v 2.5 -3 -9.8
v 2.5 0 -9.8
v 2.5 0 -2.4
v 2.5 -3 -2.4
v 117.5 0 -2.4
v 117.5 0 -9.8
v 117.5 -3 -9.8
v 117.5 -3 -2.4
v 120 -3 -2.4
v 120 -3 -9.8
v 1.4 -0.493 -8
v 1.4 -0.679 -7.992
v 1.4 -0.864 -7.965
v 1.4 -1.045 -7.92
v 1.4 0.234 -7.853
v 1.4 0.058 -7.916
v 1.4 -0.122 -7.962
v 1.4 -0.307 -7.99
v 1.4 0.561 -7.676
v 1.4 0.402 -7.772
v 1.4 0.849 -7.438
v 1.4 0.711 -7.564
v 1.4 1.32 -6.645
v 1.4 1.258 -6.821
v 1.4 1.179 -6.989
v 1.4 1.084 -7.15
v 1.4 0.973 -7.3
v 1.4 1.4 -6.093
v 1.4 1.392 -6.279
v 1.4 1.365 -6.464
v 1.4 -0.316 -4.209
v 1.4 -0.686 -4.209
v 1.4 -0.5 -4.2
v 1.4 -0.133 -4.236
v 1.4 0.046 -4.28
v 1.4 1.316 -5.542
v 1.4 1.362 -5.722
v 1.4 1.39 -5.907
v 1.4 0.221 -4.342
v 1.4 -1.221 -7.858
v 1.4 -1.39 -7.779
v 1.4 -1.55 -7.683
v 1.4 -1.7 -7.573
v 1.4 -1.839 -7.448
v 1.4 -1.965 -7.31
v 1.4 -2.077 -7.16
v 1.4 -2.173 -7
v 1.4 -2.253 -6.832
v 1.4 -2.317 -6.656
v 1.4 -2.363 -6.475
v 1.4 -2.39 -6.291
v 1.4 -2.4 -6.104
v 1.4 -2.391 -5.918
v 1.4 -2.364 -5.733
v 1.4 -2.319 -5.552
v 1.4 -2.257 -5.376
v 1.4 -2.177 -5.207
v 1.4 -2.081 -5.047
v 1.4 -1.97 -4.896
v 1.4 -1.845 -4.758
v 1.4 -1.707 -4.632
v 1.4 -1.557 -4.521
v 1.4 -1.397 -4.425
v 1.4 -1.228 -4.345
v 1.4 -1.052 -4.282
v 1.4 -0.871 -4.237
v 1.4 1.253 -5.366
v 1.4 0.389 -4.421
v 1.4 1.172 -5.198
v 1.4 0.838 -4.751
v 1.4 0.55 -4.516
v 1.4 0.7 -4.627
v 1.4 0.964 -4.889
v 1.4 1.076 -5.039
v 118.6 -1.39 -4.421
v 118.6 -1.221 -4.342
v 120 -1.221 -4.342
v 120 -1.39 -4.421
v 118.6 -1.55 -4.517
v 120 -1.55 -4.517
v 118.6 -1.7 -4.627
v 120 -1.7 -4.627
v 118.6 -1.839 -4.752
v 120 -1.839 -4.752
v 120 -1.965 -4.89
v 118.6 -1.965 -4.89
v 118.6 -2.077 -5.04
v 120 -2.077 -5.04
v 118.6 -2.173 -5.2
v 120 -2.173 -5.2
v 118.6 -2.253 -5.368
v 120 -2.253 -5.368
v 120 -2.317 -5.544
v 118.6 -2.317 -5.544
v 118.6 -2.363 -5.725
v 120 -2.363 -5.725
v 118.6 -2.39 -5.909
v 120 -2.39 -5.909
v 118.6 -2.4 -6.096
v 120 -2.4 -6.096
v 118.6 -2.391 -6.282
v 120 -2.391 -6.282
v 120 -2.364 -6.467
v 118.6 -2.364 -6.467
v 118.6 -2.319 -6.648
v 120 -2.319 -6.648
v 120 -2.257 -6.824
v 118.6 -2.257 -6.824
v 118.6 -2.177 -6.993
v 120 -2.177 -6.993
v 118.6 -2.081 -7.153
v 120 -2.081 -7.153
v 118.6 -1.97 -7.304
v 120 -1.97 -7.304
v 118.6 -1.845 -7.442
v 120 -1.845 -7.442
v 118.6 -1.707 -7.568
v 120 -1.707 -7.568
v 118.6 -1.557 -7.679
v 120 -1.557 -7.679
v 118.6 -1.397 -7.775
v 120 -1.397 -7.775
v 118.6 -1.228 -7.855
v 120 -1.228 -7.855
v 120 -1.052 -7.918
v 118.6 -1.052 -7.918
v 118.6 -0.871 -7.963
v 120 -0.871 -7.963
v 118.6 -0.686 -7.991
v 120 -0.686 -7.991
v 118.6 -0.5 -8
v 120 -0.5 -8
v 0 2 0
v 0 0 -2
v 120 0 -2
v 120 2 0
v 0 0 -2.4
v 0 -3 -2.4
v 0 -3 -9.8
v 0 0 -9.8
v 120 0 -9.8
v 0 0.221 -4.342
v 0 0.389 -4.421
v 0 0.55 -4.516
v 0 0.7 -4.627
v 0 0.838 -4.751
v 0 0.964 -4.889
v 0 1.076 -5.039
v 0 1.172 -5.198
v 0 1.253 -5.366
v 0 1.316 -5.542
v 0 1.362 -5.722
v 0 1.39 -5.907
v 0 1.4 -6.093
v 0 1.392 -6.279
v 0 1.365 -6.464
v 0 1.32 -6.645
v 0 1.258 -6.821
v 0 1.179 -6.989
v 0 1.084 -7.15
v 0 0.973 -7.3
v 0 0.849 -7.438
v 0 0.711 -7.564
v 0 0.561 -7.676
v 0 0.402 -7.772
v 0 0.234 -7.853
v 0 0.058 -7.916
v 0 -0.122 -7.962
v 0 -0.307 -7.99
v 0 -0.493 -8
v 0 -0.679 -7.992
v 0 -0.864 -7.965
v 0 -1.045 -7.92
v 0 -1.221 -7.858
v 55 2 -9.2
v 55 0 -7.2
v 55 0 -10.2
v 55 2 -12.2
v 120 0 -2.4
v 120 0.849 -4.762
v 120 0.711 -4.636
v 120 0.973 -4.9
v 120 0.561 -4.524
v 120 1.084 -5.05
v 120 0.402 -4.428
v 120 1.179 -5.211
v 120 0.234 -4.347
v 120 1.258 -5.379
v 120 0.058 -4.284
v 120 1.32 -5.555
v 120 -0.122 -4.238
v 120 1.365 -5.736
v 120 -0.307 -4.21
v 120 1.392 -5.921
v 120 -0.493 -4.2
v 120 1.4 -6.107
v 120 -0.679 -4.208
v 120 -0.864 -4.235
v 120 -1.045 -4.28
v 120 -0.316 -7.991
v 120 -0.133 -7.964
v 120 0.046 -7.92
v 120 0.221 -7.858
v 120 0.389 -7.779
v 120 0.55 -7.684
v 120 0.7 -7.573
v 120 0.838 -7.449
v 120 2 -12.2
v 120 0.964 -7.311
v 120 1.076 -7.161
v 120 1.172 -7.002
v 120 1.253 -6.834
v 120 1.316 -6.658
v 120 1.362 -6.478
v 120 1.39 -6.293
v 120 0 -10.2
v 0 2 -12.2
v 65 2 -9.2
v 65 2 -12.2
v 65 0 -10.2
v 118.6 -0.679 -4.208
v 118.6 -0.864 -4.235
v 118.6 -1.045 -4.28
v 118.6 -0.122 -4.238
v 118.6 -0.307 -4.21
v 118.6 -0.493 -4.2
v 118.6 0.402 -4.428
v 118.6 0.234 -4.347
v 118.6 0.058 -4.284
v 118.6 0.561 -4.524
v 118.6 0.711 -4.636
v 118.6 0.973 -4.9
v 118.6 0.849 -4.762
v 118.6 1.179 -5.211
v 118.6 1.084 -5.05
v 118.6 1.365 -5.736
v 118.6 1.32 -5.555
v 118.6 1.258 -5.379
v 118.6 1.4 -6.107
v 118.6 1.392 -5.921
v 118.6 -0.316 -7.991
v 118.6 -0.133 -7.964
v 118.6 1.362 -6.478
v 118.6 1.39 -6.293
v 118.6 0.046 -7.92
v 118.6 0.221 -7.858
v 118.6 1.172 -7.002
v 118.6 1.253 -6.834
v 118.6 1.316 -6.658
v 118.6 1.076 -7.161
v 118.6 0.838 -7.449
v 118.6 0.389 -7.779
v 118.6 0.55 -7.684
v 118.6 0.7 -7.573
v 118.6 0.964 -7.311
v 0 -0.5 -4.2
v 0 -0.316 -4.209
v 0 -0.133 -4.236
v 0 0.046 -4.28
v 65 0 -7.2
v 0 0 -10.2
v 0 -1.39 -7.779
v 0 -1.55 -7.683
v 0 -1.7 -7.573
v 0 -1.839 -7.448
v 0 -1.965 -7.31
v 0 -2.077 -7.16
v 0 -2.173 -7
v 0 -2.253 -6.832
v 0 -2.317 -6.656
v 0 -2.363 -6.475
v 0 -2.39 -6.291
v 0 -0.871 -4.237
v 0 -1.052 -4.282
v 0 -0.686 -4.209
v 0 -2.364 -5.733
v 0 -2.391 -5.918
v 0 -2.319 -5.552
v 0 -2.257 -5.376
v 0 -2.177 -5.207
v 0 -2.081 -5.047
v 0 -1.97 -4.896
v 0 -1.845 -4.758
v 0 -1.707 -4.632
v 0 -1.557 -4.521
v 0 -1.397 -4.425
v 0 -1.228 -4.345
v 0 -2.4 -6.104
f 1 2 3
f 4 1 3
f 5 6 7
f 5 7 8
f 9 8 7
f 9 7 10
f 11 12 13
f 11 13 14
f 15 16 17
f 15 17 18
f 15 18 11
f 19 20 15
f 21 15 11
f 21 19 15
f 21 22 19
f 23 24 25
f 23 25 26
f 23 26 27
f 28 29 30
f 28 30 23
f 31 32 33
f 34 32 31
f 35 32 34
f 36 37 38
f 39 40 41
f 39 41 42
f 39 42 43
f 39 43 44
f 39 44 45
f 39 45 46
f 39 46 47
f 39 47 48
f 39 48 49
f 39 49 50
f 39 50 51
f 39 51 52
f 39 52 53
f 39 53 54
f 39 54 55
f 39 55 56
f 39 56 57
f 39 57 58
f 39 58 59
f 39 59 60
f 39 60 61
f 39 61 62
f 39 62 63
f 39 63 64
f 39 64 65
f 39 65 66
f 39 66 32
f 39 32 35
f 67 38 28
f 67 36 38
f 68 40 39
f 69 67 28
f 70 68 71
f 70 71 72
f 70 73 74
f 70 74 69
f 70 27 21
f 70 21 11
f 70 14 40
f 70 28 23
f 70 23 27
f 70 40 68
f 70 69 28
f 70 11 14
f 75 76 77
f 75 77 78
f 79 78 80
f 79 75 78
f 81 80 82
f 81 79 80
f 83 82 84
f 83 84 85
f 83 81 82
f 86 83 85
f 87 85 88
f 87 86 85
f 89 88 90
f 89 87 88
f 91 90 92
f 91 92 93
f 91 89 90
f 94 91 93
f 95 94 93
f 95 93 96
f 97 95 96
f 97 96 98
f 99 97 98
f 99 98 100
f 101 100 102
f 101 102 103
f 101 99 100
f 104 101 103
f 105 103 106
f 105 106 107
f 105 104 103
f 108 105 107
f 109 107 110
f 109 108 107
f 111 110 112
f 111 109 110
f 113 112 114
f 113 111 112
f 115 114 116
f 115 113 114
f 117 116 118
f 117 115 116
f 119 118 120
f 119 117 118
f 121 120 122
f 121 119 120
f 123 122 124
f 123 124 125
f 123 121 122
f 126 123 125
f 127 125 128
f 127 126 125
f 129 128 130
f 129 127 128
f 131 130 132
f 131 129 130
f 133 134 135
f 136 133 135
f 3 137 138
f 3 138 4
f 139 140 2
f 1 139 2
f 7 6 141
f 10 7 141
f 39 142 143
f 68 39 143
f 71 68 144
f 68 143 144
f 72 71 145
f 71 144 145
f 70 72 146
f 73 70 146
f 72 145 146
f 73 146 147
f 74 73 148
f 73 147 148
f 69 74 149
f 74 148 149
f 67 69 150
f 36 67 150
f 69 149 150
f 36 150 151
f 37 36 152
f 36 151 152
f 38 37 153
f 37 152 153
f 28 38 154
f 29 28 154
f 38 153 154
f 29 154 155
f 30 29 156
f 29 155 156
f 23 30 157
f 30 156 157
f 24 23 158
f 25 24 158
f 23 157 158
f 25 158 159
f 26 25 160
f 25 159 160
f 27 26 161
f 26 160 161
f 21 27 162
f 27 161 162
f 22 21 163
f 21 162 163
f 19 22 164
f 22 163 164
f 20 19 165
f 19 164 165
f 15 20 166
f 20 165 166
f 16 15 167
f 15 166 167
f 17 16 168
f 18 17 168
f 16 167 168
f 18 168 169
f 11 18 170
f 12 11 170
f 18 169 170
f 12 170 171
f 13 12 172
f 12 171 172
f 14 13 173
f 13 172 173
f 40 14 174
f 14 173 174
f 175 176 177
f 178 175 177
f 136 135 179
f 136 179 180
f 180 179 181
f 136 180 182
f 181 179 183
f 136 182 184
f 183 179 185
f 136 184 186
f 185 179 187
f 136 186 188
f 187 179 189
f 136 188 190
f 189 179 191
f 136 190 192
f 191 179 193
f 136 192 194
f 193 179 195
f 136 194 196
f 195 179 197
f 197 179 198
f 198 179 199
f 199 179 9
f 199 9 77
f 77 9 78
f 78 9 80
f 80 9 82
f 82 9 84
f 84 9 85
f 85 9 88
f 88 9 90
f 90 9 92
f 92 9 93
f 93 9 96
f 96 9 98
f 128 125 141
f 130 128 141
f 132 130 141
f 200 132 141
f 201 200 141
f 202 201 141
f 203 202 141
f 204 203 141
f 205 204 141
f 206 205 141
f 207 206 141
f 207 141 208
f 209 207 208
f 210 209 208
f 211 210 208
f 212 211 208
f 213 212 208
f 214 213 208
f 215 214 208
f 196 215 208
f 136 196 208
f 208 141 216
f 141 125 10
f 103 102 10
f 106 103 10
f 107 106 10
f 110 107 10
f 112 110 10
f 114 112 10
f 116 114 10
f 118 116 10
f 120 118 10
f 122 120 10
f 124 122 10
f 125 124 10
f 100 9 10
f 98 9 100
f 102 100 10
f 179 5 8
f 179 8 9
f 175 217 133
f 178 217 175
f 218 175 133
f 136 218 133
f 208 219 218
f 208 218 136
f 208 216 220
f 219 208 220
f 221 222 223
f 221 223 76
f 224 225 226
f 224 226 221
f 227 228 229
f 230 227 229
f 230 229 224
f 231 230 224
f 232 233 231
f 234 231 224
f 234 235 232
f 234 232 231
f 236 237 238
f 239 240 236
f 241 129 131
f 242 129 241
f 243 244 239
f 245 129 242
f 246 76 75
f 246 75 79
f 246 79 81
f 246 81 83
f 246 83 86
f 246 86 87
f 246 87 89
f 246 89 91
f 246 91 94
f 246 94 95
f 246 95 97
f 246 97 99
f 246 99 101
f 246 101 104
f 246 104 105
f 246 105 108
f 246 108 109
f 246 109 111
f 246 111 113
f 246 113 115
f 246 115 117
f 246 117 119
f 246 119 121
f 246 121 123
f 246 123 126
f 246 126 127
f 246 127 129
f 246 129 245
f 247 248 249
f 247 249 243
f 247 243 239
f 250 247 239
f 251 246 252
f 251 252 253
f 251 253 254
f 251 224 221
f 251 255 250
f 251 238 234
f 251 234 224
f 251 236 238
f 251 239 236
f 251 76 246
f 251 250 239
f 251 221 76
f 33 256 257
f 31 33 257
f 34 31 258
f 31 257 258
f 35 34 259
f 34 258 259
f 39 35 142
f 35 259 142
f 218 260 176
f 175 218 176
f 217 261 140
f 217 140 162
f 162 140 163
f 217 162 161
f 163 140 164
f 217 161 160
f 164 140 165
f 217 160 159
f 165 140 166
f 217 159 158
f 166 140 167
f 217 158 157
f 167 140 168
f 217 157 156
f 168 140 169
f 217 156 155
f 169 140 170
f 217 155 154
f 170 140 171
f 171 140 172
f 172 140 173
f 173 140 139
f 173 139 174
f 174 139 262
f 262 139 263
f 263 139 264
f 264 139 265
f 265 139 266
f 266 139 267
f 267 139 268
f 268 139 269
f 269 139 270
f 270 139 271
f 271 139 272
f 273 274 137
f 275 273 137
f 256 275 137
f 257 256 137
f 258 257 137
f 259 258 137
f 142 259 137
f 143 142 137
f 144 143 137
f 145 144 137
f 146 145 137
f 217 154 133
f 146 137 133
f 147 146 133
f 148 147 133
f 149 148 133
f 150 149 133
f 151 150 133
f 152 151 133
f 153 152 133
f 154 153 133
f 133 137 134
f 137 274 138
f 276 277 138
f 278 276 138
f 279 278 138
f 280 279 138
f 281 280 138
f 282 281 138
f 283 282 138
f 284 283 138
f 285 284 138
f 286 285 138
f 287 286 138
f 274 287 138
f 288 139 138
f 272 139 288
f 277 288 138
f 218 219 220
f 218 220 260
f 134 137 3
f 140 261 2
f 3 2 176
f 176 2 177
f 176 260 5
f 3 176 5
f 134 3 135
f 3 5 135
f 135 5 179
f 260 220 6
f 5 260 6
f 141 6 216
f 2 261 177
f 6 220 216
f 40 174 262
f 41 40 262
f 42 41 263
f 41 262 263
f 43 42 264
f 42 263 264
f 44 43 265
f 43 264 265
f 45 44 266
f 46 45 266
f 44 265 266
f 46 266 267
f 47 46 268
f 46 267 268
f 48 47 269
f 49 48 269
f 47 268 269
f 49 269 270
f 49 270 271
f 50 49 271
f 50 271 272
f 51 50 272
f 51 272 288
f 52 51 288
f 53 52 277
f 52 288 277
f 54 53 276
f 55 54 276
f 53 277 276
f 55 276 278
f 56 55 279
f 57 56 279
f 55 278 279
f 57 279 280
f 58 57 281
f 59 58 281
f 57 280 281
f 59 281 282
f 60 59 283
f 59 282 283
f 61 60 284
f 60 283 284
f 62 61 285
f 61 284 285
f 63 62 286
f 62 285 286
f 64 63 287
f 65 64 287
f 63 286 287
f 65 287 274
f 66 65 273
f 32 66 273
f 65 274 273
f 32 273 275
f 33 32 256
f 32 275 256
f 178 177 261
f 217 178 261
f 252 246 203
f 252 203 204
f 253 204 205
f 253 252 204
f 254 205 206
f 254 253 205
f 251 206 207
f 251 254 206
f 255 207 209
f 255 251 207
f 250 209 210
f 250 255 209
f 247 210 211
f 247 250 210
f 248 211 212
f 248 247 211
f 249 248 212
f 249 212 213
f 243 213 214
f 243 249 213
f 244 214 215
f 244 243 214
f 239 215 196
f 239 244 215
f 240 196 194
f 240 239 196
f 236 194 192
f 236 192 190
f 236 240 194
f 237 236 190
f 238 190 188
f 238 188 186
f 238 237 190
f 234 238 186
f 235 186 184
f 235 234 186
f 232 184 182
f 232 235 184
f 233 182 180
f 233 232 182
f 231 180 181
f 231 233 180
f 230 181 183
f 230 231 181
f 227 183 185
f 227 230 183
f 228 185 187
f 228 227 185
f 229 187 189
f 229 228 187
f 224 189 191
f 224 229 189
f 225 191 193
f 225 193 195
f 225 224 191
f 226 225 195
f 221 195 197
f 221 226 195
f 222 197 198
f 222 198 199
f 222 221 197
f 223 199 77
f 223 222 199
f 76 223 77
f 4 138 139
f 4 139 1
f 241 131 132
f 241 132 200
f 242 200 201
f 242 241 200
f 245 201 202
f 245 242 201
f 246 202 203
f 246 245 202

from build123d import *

# Parameters (mm, degrees)
BOSS_EXTRU_2_DEPTH      = 2
CHANFREIN2_SIZE         = 2
ESQUISSE6_W             = 2.5
ESQUISSE6_H             = 7.4
BOSS_EXTRU_5_DEPTH      = 3
ENL_V_MAT_EXTRU_5_DEPTH = 1.4
ENL_V_START             = -1.4
ENL_V_MAT_EXTRU_6_DEPTH = 1.4


with BuildPart() as part:
    # Esquisse1 → Boss.-Extru.2 (new body)
    with BuildSketch(Plane(origin=(0, 0, 0), x_dir=(1, 0, 0), z_dir=(0, 1, 0))):
        Polygon((0, 12.2), (0, 0), (120, 0), (120, 12.2), (65, 12.2), (65, 9.2), (55, 9.2), (55, 12.2), align=None)
    extrude(amount=BOSS_EXTRU_2_DEPTH)

    # Chanfrein2
    chanfrein2_edges = [part.edges().sort_by_distance(p)[0] for p in [
        (92.5, 0, -12.2),
        (27.5, 0, -12.2),
        (60, 0, -9.2),
        (60, 0, 0),
    ]]
    chamfer(chanfrein2_edges, length=CHANFREIN2_SIZE - 0.0001)  # a hair under: the kernel refuses the full size

    # Esquisse6 → Boss.-Extru.5 (add)
    with BuildSketch(Plane.XZ):
        with Locations((1.25, -6.1)):
            Rectangle(ESQUISSE6_W, ESQUISSE6_H)
        with Locations((118.75, -6.1)):
            Rectangle(ESQUISSE6_W, ESQUISSE6_H)
    extrude(amount=BOSS_EXTRU_5_DEPTH)

    # Esquisse9 → Enlèv. mat.-Extru.5 (cut)
    with BuildSketch(Plane.ZY):
        with BuildLine():
            ThreePointArc((-4.2, -0.5), (-4.235817666, -0.132815816), (-4.341920237, 0.220524493))
            Line((-4.341920237, 0.220524493), (-7.858079763, -1.220524493))
            ThreePointArc((-7.858079763, -1.220524493), (-5.732815816, -2.364182334), (-4.2, -0.5))
        make_face()
        with BuildLine():
            Line((-7.858079763, -1.220524493), (-4.341920237, 0.220524493))
            ThreePointArc((-4.341920237, 0.220524493), (-6.820524493, 1.258079763), (-7.858079763, -1.220524493))
        make_face()
    extrude(amount=-ENL_V_MAT_EXTRU_5_DEPTH, mode=Mode.SUBTRACT)

    # Esquisse10 → Enlèv. mat.-Extru.6 (cut)
    with BuildSketch(Plane(origin=(120, 0, 0), x_dir=(0, 0, -1), z_dir=(1, 0, 0)).offset(ENL_V_START)):
        with BuildLine():
            ThreePointArc((8, -0.5), (7.964182334, -0.132815816), (7.858079763, 0.220524493))
            Line((7.858079763, 0.220524493), (4.341920237, -1.220524493))
            ThreePointArc((4.341920237, -1.220524493), (6.467184184, -2.364182334), (8, -0.5))
        make_face()
        with BuildLine():
            Line((4.341920237, -1.220524493), (7.858079763, 0.220524493))
            ThreePointArc((7.858079763, 0.220524493), (5.379475507, 1.258079763), (4.341920237, -1.220524493))
        make_face()
    extrude(amount=ENL_V_MAT_EXTRU_6_DEPTH, mode=Mode.SUBTRACT)


solid = part.part
